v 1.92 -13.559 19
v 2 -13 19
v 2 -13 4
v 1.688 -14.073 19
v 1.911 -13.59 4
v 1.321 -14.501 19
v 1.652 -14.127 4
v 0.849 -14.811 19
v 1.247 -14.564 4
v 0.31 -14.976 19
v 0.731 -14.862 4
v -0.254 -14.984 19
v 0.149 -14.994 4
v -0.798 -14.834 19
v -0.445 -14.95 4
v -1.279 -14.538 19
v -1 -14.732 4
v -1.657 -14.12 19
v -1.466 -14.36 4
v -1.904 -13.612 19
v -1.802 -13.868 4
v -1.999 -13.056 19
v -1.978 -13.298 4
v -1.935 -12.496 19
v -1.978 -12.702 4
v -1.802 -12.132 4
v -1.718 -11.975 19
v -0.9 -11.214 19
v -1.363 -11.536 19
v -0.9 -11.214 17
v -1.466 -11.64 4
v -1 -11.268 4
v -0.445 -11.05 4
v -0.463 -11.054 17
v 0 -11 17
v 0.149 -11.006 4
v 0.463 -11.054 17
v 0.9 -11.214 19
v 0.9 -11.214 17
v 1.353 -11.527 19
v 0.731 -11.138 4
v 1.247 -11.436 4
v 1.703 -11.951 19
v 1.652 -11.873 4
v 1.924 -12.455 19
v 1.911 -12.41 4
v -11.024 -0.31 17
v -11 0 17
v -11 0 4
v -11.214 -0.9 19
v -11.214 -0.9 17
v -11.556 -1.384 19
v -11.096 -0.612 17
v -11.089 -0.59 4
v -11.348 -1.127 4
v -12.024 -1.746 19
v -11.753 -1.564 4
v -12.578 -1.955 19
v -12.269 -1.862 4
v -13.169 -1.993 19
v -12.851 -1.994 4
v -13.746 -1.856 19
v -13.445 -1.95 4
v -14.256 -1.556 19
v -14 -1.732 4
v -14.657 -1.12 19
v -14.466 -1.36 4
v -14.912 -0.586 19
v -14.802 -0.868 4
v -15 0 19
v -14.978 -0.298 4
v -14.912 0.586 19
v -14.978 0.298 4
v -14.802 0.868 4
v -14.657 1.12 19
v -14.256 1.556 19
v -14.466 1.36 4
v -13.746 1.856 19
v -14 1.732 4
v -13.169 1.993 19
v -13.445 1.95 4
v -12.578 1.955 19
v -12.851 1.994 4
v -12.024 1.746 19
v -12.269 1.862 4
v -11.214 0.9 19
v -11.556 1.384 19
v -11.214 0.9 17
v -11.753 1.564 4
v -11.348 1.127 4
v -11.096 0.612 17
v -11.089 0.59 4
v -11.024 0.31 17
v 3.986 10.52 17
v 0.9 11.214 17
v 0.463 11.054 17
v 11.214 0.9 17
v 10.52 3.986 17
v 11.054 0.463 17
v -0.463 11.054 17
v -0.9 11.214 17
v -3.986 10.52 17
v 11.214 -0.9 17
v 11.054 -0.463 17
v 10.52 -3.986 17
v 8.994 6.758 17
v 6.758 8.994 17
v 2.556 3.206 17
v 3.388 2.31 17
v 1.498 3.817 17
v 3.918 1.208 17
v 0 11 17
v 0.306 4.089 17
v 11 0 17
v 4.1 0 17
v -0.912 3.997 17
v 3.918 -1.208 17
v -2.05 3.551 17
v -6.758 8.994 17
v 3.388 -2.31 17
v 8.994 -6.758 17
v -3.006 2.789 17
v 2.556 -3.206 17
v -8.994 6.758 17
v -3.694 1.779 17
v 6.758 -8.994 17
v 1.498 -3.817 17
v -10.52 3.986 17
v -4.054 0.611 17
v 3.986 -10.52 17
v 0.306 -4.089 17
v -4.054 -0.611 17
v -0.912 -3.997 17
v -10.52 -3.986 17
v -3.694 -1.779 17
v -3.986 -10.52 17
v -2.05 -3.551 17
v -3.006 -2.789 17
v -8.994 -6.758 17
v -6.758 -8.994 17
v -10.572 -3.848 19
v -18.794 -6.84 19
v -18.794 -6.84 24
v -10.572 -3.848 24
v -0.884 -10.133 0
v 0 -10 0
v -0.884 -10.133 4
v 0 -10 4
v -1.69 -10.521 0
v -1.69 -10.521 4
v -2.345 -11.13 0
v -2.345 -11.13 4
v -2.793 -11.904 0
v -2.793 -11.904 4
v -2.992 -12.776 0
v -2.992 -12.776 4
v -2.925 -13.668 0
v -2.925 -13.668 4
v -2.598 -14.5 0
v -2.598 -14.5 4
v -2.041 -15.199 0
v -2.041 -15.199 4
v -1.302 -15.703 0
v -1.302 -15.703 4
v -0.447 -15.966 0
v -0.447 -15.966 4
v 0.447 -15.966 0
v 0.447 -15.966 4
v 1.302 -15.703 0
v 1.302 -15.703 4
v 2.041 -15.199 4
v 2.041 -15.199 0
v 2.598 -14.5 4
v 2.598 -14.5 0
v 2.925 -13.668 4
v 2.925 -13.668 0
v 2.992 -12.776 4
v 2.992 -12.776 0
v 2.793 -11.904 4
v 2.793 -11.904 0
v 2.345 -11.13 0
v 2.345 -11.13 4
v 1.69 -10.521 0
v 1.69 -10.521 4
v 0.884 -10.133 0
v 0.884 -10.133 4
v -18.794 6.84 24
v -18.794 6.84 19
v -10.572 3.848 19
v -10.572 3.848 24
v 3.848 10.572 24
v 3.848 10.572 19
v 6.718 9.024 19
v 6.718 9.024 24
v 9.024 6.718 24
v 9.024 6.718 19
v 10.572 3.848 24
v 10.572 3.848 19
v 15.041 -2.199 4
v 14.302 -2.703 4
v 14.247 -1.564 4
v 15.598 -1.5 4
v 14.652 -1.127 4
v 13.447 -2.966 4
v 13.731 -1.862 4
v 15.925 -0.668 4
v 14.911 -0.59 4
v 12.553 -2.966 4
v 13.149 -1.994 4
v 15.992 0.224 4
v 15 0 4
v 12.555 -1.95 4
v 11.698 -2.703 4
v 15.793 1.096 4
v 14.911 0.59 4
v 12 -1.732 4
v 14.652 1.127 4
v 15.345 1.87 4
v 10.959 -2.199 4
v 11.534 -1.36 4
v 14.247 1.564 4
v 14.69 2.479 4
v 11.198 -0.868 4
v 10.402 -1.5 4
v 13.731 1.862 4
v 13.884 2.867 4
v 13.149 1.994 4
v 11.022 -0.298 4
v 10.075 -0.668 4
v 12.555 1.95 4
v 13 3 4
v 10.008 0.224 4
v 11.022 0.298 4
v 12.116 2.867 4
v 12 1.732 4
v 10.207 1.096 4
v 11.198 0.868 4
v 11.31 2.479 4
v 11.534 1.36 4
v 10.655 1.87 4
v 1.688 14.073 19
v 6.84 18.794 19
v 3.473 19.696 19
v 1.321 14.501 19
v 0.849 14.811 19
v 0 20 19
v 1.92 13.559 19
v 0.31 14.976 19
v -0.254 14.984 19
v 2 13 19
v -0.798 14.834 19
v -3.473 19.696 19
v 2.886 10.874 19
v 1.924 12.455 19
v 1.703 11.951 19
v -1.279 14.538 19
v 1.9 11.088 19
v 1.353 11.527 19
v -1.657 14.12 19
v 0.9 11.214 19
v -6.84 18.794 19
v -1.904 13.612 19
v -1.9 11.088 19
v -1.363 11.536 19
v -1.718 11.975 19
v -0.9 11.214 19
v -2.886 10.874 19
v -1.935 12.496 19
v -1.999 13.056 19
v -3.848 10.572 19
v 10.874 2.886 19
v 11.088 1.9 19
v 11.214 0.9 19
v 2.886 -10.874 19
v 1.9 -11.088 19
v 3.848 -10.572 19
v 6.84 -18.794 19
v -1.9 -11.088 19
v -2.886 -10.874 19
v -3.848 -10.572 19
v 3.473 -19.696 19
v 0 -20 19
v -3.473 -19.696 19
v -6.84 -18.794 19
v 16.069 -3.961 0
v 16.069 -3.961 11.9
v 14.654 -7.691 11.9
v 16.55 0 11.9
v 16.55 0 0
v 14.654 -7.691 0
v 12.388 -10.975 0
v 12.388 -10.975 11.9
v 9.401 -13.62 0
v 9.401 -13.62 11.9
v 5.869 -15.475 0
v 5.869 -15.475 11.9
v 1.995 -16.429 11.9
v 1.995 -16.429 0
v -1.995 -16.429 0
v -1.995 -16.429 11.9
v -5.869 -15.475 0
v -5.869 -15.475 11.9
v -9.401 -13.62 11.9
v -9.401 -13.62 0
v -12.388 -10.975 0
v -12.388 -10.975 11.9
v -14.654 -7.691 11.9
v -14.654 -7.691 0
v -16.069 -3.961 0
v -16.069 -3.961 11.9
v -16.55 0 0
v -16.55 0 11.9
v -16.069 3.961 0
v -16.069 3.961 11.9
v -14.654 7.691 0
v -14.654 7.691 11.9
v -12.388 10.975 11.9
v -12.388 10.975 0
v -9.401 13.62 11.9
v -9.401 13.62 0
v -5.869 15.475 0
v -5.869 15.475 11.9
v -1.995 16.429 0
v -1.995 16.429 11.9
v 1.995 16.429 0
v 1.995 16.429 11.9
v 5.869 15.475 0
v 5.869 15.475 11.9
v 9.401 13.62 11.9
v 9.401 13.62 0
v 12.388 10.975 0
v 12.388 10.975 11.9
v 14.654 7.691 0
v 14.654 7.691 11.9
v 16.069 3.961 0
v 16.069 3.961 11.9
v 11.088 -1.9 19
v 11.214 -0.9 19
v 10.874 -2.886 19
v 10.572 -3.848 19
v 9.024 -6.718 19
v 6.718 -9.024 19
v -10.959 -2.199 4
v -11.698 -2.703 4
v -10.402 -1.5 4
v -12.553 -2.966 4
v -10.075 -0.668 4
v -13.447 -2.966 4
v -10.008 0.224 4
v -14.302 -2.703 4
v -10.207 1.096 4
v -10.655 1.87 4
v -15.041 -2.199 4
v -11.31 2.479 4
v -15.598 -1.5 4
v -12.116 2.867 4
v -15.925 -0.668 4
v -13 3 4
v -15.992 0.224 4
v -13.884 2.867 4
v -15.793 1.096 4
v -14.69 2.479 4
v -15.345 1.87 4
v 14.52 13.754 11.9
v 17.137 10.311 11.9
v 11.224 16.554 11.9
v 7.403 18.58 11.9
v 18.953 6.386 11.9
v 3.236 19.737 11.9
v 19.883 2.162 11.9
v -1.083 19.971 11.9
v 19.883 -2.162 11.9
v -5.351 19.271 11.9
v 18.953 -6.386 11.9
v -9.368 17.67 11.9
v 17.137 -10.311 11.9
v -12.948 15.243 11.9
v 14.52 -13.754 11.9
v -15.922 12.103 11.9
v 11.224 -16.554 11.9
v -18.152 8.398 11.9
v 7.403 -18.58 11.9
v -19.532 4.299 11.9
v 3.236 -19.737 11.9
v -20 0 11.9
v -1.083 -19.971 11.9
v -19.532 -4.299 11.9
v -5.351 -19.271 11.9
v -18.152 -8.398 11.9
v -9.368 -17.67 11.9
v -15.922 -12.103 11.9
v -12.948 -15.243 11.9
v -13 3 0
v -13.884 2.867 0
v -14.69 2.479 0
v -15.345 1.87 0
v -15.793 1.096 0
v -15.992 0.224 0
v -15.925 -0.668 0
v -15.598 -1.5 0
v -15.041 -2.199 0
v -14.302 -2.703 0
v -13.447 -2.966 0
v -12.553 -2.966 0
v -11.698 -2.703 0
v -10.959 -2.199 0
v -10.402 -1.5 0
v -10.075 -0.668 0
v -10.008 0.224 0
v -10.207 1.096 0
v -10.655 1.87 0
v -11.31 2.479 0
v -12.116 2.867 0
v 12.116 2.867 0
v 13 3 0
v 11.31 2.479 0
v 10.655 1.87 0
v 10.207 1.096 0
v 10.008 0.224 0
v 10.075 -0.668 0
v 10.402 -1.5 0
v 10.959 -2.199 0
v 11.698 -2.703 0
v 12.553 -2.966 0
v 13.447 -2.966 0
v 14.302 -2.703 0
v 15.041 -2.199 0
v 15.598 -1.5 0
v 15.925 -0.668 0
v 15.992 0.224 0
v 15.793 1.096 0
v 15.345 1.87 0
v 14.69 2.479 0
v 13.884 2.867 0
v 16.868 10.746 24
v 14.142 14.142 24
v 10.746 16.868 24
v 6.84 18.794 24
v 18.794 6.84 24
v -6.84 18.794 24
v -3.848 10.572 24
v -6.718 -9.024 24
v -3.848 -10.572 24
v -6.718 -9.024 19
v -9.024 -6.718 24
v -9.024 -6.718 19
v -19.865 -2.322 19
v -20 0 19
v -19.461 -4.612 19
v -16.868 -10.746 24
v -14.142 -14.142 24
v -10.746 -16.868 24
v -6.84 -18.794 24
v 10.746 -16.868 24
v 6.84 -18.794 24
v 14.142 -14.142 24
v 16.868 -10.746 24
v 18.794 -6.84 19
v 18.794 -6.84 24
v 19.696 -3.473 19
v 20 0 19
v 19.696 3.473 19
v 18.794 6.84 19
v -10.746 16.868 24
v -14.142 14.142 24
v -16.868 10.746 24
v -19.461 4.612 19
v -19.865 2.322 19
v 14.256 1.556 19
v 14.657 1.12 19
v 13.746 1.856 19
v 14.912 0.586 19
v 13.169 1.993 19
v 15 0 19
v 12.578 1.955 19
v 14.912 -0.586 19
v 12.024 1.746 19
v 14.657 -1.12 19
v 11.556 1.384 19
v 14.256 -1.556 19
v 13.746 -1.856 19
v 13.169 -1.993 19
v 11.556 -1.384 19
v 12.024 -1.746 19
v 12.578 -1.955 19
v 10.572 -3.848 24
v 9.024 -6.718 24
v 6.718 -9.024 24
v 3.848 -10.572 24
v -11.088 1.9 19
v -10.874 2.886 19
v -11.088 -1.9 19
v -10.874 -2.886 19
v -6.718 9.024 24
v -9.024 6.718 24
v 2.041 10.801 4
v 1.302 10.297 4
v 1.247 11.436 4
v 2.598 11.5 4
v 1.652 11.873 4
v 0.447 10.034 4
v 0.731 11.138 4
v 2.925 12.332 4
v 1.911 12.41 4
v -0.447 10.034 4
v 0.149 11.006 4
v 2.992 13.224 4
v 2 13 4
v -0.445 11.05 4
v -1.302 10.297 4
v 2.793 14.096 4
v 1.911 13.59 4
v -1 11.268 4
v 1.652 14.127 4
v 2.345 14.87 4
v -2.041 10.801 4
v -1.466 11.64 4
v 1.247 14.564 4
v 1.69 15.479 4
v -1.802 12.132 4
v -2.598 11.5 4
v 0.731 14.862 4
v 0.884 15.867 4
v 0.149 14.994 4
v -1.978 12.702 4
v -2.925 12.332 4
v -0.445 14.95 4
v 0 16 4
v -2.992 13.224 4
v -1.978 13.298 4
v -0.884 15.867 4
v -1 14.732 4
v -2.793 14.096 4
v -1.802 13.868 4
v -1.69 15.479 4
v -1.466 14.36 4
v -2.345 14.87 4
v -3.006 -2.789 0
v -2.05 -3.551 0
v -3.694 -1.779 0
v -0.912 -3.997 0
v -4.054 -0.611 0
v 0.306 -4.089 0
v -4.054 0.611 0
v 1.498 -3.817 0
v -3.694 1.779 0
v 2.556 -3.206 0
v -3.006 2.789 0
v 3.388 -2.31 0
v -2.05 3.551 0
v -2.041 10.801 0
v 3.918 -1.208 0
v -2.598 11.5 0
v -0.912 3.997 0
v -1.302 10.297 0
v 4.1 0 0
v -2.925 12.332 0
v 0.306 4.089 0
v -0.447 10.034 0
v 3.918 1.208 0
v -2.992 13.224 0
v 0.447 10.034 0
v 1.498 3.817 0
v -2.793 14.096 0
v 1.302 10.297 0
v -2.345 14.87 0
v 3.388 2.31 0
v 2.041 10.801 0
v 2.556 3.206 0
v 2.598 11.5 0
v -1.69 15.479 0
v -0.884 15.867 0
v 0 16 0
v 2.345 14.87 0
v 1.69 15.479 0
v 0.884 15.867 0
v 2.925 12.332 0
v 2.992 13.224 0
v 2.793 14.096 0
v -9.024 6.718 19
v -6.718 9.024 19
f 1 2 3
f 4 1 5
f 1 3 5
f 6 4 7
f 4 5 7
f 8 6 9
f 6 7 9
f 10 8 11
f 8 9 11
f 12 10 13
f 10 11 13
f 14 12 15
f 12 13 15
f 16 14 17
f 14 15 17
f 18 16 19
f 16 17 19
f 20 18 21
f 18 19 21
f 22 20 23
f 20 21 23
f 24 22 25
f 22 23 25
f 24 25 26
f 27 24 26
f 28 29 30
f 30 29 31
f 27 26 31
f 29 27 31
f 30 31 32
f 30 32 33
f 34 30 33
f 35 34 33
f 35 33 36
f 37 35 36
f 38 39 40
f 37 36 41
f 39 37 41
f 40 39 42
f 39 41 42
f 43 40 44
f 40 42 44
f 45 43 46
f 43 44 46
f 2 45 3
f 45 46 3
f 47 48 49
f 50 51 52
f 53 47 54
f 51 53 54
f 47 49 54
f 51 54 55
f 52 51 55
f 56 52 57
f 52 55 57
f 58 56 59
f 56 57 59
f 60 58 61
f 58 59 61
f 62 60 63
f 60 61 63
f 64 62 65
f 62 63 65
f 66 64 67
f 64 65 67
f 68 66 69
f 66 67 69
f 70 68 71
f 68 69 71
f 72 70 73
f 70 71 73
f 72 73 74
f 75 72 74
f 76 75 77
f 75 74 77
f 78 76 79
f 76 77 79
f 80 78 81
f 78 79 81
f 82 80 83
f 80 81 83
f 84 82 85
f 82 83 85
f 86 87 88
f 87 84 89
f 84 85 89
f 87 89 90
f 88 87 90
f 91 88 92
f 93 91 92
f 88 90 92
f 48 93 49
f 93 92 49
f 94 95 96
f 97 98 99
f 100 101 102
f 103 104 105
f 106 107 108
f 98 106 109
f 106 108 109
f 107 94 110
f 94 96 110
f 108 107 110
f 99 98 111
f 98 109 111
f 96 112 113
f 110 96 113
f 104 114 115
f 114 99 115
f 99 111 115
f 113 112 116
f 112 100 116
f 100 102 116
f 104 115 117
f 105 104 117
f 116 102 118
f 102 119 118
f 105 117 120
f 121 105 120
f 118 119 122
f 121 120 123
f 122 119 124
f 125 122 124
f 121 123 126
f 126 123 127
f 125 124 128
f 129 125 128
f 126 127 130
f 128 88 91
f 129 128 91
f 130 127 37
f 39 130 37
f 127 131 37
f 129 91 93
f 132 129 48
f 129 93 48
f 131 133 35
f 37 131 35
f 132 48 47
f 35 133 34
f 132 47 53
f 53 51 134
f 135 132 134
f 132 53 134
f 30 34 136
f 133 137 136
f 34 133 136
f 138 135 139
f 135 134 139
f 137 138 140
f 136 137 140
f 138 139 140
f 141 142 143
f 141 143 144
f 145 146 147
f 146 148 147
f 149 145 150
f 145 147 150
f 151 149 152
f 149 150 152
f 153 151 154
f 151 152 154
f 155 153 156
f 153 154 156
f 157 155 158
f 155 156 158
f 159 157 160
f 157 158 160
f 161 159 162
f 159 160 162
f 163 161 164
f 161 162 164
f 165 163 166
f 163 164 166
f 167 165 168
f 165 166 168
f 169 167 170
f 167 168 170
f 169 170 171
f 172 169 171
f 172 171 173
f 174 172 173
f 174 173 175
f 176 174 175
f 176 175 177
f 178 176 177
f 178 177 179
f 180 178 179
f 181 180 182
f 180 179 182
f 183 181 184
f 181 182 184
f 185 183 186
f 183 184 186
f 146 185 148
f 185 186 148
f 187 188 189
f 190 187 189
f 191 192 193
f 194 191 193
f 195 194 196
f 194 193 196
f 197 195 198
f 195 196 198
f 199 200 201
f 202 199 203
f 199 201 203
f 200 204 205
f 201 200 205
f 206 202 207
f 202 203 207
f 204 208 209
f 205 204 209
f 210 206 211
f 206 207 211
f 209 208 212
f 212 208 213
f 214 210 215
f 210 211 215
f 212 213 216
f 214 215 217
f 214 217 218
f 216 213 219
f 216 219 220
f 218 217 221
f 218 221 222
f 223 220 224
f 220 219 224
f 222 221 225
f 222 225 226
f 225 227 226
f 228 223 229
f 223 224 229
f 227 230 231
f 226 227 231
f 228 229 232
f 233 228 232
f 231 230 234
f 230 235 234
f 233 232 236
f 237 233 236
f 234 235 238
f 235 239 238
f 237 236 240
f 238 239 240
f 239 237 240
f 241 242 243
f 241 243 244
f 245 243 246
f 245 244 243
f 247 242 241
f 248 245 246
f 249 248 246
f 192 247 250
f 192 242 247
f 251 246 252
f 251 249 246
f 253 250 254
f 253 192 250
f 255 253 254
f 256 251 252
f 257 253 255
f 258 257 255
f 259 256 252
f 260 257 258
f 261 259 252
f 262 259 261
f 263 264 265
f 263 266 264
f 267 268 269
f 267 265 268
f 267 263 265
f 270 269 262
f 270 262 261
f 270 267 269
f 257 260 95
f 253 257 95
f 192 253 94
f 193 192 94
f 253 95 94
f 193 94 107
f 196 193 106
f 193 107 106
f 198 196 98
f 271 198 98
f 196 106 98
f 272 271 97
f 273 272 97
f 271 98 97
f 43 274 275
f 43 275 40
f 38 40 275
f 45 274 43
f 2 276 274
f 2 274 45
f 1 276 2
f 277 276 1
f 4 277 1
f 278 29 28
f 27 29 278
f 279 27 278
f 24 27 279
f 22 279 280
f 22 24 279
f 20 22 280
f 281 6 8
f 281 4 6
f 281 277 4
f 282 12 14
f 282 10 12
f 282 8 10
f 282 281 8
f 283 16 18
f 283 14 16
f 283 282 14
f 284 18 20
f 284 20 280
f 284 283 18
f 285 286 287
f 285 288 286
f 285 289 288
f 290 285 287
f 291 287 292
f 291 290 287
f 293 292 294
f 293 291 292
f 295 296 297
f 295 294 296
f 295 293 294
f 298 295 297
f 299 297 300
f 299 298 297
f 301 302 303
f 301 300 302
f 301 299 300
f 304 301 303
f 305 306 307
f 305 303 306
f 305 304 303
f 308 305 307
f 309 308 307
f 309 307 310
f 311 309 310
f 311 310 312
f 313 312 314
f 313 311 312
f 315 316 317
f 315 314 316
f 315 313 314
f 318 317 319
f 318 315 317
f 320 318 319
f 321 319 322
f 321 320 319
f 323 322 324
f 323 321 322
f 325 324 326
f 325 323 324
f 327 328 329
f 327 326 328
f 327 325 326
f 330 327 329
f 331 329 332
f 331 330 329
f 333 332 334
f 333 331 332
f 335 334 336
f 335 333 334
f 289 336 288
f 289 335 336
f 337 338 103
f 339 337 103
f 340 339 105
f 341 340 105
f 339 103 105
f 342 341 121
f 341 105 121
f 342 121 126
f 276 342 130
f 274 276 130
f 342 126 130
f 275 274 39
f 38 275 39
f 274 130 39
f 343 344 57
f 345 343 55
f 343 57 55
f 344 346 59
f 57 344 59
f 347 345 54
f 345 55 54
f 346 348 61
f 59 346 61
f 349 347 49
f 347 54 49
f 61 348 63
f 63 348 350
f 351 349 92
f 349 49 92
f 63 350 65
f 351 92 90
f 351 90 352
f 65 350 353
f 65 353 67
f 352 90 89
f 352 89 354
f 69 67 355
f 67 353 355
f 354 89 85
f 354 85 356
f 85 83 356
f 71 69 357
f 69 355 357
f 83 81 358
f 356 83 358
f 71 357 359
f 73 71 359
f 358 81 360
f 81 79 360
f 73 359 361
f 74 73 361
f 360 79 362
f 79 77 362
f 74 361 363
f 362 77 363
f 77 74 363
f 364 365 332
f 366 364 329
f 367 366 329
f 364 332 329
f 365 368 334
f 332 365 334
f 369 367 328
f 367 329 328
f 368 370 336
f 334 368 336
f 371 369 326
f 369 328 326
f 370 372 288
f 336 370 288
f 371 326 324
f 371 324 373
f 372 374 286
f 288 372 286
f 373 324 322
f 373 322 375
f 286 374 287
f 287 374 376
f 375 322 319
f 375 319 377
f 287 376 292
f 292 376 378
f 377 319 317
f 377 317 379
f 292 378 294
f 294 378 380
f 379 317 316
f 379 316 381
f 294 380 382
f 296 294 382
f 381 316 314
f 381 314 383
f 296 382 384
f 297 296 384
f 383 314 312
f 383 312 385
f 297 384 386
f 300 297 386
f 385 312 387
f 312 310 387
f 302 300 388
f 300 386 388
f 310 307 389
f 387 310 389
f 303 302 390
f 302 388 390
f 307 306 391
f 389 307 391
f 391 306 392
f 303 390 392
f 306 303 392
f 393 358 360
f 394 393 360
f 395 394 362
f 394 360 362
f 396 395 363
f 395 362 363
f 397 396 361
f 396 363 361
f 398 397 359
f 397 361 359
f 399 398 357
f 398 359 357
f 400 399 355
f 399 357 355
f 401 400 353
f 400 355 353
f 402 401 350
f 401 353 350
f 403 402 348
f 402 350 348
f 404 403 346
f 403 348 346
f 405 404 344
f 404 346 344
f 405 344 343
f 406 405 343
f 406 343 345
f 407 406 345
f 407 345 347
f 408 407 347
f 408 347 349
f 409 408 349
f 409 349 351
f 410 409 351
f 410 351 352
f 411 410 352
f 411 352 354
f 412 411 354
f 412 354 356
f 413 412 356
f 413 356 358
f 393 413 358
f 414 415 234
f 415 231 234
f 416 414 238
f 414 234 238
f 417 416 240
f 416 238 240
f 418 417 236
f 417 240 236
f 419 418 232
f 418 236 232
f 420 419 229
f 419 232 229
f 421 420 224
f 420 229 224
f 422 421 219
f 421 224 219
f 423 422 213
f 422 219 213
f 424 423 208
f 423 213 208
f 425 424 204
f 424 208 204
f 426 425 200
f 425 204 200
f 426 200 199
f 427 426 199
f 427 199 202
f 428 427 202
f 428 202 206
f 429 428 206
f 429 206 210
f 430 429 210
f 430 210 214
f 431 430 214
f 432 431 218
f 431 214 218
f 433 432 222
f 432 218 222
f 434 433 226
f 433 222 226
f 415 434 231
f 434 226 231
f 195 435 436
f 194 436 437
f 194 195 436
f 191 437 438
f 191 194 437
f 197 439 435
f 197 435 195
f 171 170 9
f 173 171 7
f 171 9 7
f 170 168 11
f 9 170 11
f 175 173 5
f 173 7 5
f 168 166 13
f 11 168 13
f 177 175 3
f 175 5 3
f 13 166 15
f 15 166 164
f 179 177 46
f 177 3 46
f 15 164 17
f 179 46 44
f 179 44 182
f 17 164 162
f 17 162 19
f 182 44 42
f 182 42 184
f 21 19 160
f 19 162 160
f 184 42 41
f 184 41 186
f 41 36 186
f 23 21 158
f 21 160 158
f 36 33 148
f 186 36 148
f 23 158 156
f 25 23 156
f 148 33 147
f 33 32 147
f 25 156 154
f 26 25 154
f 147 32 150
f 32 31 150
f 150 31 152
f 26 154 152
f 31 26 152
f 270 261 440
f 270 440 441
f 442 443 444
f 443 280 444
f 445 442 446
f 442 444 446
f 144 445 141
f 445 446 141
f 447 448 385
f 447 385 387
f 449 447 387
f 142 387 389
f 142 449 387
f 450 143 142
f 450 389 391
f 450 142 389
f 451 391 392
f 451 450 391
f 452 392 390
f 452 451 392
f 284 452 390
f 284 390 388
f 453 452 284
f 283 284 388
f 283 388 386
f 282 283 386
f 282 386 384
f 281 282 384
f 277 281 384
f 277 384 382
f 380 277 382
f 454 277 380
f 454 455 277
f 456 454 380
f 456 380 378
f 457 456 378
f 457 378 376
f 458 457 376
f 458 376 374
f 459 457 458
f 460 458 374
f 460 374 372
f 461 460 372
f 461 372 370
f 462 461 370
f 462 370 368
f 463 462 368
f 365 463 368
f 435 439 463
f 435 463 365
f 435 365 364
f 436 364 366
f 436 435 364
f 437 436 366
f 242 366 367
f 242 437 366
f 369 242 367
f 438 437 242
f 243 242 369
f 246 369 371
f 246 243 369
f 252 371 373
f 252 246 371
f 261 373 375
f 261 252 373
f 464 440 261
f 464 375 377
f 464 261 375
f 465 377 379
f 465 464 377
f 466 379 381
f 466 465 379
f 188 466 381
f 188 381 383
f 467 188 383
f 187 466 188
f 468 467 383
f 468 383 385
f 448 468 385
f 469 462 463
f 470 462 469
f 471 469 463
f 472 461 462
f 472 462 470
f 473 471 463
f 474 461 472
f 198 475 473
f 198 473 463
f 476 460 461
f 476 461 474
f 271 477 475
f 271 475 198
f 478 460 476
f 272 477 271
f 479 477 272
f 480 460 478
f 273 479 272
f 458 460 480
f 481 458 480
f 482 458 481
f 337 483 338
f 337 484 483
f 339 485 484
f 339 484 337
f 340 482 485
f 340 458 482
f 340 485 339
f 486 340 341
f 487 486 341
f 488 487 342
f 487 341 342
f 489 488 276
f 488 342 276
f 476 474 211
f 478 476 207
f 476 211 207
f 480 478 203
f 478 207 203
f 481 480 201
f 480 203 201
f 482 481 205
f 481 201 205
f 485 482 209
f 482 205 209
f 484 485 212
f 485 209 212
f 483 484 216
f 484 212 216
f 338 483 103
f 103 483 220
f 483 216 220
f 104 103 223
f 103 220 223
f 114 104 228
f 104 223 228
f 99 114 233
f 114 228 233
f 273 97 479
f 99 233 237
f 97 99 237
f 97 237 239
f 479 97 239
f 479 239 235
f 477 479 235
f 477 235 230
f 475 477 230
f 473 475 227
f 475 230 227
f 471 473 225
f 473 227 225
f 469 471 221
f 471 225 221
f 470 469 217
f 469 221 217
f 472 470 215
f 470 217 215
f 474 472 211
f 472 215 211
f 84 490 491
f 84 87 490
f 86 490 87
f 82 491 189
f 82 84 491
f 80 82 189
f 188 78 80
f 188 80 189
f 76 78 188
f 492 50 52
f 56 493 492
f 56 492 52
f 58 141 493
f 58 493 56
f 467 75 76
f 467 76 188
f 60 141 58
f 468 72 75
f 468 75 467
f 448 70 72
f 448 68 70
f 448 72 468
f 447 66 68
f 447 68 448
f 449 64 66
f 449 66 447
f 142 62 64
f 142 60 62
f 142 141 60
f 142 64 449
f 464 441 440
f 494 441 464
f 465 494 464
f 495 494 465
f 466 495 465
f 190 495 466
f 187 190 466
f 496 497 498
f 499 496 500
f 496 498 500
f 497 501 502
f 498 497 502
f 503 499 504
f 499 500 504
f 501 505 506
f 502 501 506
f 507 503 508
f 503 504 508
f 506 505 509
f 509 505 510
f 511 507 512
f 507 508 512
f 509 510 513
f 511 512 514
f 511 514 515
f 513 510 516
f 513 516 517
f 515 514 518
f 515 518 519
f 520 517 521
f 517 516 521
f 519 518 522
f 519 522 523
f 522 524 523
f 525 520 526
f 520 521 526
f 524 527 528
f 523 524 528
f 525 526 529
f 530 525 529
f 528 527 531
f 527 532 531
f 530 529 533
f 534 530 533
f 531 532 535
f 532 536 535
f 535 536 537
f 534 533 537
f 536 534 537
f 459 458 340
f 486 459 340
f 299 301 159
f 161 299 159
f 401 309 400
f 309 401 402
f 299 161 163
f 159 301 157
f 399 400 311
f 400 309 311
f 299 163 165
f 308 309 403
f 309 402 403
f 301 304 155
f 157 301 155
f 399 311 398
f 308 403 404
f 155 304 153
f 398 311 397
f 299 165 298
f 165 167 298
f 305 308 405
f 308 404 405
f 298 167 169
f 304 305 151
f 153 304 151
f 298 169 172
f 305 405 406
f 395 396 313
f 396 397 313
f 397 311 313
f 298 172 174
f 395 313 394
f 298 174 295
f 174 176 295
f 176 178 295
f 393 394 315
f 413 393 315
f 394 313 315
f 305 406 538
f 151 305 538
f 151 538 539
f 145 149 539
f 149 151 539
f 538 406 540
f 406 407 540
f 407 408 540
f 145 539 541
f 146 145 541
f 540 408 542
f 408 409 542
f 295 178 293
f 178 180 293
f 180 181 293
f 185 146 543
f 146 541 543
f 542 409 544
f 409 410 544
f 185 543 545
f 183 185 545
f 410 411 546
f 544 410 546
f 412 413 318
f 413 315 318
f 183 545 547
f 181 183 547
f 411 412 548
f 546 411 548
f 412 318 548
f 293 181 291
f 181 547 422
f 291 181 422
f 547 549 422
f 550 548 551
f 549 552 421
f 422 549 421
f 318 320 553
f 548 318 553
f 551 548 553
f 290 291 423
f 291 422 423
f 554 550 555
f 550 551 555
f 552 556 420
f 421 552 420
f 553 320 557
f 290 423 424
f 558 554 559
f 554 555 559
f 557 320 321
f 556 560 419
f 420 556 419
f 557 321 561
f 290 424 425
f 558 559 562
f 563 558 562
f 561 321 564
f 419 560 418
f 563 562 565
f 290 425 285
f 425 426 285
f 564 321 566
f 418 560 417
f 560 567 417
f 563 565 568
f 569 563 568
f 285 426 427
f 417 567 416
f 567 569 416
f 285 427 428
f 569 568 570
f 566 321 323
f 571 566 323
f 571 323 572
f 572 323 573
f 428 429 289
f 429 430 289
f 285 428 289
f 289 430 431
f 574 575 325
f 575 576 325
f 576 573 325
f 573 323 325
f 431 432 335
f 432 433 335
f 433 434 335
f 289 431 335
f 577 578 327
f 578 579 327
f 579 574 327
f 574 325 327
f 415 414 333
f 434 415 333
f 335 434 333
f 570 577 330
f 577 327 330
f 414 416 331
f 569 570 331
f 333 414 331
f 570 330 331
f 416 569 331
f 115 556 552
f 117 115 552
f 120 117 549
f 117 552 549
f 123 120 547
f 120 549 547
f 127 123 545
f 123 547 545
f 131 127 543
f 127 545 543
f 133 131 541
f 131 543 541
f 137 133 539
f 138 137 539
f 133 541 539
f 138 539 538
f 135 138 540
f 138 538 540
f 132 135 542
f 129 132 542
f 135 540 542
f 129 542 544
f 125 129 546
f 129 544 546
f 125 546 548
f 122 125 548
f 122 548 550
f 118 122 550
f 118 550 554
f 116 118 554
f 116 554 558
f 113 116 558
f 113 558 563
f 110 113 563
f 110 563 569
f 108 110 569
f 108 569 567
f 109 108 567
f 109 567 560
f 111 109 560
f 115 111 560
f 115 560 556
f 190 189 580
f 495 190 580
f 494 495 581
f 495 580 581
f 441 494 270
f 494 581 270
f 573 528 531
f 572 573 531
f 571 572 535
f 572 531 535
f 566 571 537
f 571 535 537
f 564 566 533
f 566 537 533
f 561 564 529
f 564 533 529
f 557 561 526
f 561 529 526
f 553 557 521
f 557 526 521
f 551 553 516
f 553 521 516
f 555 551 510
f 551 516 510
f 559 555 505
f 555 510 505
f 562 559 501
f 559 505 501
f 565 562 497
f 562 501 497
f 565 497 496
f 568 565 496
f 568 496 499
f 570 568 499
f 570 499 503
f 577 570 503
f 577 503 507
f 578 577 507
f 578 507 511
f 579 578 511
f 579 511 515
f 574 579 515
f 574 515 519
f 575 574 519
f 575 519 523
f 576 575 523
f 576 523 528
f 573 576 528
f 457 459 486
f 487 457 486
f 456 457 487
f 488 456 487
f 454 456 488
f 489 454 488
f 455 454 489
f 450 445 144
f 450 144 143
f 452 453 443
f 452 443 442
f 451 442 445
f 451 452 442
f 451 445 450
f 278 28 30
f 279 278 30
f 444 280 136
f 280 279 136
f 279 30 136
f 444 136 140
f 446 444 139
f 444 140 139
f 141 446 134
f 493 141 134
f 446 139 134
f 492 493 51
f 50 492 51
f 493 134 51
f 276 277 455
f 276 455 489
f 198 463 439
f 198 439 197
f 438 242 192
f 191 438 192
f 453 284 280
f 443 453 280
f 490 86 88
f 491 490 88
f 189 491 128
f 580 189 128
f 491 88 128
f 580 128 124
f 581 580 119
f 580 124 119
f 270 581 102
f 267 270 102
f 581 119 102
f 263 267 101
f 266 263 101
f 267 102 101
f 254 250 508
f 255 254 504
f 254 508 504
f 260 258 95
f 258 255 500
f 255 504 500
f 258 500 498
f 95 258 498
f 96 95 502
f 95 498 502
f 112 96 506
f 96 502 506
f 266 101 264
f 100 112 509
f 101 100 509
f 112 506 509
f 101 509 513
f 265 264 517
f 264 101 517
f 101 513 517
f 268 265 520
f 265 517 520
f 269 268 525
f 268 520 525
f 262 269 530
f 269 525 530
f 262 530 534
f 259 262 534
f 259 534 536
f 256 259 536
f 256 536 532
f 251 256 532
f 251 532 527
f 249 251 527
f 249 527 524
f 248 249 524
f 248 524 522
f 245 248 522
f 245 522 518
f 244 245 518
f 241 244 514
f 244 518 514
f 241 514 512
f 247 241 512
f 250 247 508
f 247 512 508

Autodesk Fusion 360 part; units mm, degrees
sketch "Esquisse1" plane through (0, 0, 0) normal (0, 0, 1) x (1, 0, 0)
  circle A0 centre (0, 0) radius 16.55
  circle A1 centre (0, 0) radius 4.1
  circle A2 centre (-13, 0) radius 2
  circle A3 centre (0, -13) radius 2
  circle A4 centre (13, 0) radius 2
  circle A5 centre (0, 13) radius 2
  dimension "d1" = 33.1
  dimension "d2" = 8.2
  dimension "d3" = 4
  dimension "d4" = 13
  dimension "d6" = 360
extrude "Extrusion1" add sketch "Esquisse1" along normal blind 19
sketch "Esquisse2" plane through (0, 0, 0) normal (0, 0, -1) x (1, 0, 0)
  circle A0 centre (13, 0) radius 2
  circle A1 centre (-13, 0) radius 2
  circle A2 centre (0, 0) radius 4.1
  circle A3 centre (0, 13) radius 2
  circle A4 centre (0, -13) radius 2
  circle A5 centre (0, 0) radius 16.55
hole "Perçage1" at (0, -13, 0) direction (0, 0, 1) diameter 6 depth 4 tip angle 180
hole "Perçage2" at (-13, 0, 0) direction (0, 0, 1) diameter 6 depth 4 tip angle 180
hole "Perçage3" at (13, 0, 0) direction (0, 0, 1) diameter 6 depth 4 tip angle 180
hole "Perçage4" at (0, 13, 0) direction (0, 0, 1) diameter 6 depth 4 tip angle 180
hole "Perçage5" at (0, 0, 19) direction (0, 0, -1) diameter 22.5 depth 2 tip angle 180
sketch "Esquisse3" plane through (0, 0, 19) normal (0, 0, 1) x (-1, 0, 0)
  circle A0 centre (0, 0) radius 16.55
  arc A1 (11.2139, 0.9) -> (0.9, 11.2139) centre (0, 0) ccw
  arc A2 (11.2139, -0.9) -> (11.2139, 0.9) centre (13, 0) ccw
  arc A3 (0.9, -11.2139) -> (11.2139, -0.9) centre (0, 0) ccw
  arc A4 (-0.9, -11.2139) -> (0.9, -11.2139) centre (0, -13) ccw
  arc A5 (-11.2139, -0.9) -> (-0.9, -11.2139) centre (0, 0) ccw
  arc A6 (-11.2139, 0.9) -> (-11.2139, -0.9) centre (-13, 0) ccw
  arc A7 (-0.9, 11.2139) -> (-11.2139, 0.9) centre (0, 0) ccw
  arc A8 (0.9, 11.2139) -> (-0.9, 11.2139) centre (0, 13) ccw
  circle A9 centre (0, 0) radius 20
  dimension "d24" = 40
extrude "Extrusion2" add sketch "Esquisse3" against normal blind 7.1 contours A9
sketch "Esquisse4" plane through (0, 0, 19) normal (0, 0, 1) x (-1, 0, 0)
  circle A0 centre (0, 0) radius 20
  arc A1 (11.2139, 0.9) -> (0.9, 11.2139) centre (0, 0) ccw
  arc A2 (11.2139, -0.9) -> (11.2139, 0.9) centre (13, 0) ccw
  arc A3 (0.9, -11.2139) -> (11.2139, -0.9) centre (0, 0) ccw
  arc A4 (-0.9, -11.2139) -> (0.9, -11.2139) centre (0, -13) ccw
  arc A5 (-11.2139, -0.9) -> (-0.9, -11.2139) centre (0, 0) ccw
  arc A6 (-11.2139, 0.9) -> (-11.2139, -0.9) centre (-13, 0) ccw
  arc A7 (-0.9, 11.2139) -> (-11.2139, 0.9) centre (0, 0) ccw
  arc A8 (0.9, 11.2139) -> (-0.9, 11.2139) centre (0, 13) ccw
  line L0 (0, 0) -> (14.1421, -14.1421) construction
  line L1 (0, 0) -> (20, 0) construction
  line L2 (0, 0) -> (18.7939, -6.8404) construction
  line L3 (0, 0) -> (6.8404, -18.7939) construction
  line L4 (0, 0) -> (20, 0) construction
  line L5 (18.7939, -6.8404) -> (10.5715, -3.8477)
  line L6 (6.8404, -18.7939) -> (3.8477, -10.5715)
  arc A9 (3.8477, -10.5715) -> (10.5715, -3.8477) centre (0, 0) ccw
  arc A10 (6.8404, -18.7939) -> (18.7939, -6.8404) centre (0, 0) ccw
  arc A11 (10.5715, 3.8477) -> (3.8477, 10.5715) centre (0, 0) ccw
  line L7 (6.8404, 18.7939) -> (3.8477, 10.5715)
  arc A12 (18.7939, 6.8404) -> (6.8404, 18.7939) centre (0, 0) ccw
  line L8 (18.7939, 6.8404) -> (10.5715, 3.8477)
  arc A13 (-3.8477, 10.5715) -> (-10.5715, 3.8477) centre (0, 0) ccw
  line L9 (-18.7939, 6.8404) -> (-10.5715, 3.8477)
  arc A14 (-6.8404, 18.7939) -> (-18.7939, 6.8404) centre (0, 0) ccw
  line L10 (-6.8404, 18.7939) -> (-3.8477, 10.5715)
  arc A15 (-10.5715, -3.8477) -> (-3.8477, -10.5715) centre (0, 0) ccw
  line L11 (-6.8404, -18.7939) -> (-3.8477, -10.5715)
  arc A16 (-18.7939, -6.8404) -> (-6.8404, -18.7939) centre (0, 0) ccw
  line L12 (-18.7939, -6.8404) -> (-10.5715, -3.8477)
  dimension "d27" = 45
  dimension "d28" = 25
  dimension "d29" = 70
  dimension "d31" = 360
extrude "Extrusion3" add sketch "Esquisse4" along normal blind 5 contours A0 A1 A11 L7 A12 L8 | A0 A3 L5 L6 A9 A10 | A0 A7 A13 L9 A14 L10 | A0 A5 A15 L11 A16 L12
